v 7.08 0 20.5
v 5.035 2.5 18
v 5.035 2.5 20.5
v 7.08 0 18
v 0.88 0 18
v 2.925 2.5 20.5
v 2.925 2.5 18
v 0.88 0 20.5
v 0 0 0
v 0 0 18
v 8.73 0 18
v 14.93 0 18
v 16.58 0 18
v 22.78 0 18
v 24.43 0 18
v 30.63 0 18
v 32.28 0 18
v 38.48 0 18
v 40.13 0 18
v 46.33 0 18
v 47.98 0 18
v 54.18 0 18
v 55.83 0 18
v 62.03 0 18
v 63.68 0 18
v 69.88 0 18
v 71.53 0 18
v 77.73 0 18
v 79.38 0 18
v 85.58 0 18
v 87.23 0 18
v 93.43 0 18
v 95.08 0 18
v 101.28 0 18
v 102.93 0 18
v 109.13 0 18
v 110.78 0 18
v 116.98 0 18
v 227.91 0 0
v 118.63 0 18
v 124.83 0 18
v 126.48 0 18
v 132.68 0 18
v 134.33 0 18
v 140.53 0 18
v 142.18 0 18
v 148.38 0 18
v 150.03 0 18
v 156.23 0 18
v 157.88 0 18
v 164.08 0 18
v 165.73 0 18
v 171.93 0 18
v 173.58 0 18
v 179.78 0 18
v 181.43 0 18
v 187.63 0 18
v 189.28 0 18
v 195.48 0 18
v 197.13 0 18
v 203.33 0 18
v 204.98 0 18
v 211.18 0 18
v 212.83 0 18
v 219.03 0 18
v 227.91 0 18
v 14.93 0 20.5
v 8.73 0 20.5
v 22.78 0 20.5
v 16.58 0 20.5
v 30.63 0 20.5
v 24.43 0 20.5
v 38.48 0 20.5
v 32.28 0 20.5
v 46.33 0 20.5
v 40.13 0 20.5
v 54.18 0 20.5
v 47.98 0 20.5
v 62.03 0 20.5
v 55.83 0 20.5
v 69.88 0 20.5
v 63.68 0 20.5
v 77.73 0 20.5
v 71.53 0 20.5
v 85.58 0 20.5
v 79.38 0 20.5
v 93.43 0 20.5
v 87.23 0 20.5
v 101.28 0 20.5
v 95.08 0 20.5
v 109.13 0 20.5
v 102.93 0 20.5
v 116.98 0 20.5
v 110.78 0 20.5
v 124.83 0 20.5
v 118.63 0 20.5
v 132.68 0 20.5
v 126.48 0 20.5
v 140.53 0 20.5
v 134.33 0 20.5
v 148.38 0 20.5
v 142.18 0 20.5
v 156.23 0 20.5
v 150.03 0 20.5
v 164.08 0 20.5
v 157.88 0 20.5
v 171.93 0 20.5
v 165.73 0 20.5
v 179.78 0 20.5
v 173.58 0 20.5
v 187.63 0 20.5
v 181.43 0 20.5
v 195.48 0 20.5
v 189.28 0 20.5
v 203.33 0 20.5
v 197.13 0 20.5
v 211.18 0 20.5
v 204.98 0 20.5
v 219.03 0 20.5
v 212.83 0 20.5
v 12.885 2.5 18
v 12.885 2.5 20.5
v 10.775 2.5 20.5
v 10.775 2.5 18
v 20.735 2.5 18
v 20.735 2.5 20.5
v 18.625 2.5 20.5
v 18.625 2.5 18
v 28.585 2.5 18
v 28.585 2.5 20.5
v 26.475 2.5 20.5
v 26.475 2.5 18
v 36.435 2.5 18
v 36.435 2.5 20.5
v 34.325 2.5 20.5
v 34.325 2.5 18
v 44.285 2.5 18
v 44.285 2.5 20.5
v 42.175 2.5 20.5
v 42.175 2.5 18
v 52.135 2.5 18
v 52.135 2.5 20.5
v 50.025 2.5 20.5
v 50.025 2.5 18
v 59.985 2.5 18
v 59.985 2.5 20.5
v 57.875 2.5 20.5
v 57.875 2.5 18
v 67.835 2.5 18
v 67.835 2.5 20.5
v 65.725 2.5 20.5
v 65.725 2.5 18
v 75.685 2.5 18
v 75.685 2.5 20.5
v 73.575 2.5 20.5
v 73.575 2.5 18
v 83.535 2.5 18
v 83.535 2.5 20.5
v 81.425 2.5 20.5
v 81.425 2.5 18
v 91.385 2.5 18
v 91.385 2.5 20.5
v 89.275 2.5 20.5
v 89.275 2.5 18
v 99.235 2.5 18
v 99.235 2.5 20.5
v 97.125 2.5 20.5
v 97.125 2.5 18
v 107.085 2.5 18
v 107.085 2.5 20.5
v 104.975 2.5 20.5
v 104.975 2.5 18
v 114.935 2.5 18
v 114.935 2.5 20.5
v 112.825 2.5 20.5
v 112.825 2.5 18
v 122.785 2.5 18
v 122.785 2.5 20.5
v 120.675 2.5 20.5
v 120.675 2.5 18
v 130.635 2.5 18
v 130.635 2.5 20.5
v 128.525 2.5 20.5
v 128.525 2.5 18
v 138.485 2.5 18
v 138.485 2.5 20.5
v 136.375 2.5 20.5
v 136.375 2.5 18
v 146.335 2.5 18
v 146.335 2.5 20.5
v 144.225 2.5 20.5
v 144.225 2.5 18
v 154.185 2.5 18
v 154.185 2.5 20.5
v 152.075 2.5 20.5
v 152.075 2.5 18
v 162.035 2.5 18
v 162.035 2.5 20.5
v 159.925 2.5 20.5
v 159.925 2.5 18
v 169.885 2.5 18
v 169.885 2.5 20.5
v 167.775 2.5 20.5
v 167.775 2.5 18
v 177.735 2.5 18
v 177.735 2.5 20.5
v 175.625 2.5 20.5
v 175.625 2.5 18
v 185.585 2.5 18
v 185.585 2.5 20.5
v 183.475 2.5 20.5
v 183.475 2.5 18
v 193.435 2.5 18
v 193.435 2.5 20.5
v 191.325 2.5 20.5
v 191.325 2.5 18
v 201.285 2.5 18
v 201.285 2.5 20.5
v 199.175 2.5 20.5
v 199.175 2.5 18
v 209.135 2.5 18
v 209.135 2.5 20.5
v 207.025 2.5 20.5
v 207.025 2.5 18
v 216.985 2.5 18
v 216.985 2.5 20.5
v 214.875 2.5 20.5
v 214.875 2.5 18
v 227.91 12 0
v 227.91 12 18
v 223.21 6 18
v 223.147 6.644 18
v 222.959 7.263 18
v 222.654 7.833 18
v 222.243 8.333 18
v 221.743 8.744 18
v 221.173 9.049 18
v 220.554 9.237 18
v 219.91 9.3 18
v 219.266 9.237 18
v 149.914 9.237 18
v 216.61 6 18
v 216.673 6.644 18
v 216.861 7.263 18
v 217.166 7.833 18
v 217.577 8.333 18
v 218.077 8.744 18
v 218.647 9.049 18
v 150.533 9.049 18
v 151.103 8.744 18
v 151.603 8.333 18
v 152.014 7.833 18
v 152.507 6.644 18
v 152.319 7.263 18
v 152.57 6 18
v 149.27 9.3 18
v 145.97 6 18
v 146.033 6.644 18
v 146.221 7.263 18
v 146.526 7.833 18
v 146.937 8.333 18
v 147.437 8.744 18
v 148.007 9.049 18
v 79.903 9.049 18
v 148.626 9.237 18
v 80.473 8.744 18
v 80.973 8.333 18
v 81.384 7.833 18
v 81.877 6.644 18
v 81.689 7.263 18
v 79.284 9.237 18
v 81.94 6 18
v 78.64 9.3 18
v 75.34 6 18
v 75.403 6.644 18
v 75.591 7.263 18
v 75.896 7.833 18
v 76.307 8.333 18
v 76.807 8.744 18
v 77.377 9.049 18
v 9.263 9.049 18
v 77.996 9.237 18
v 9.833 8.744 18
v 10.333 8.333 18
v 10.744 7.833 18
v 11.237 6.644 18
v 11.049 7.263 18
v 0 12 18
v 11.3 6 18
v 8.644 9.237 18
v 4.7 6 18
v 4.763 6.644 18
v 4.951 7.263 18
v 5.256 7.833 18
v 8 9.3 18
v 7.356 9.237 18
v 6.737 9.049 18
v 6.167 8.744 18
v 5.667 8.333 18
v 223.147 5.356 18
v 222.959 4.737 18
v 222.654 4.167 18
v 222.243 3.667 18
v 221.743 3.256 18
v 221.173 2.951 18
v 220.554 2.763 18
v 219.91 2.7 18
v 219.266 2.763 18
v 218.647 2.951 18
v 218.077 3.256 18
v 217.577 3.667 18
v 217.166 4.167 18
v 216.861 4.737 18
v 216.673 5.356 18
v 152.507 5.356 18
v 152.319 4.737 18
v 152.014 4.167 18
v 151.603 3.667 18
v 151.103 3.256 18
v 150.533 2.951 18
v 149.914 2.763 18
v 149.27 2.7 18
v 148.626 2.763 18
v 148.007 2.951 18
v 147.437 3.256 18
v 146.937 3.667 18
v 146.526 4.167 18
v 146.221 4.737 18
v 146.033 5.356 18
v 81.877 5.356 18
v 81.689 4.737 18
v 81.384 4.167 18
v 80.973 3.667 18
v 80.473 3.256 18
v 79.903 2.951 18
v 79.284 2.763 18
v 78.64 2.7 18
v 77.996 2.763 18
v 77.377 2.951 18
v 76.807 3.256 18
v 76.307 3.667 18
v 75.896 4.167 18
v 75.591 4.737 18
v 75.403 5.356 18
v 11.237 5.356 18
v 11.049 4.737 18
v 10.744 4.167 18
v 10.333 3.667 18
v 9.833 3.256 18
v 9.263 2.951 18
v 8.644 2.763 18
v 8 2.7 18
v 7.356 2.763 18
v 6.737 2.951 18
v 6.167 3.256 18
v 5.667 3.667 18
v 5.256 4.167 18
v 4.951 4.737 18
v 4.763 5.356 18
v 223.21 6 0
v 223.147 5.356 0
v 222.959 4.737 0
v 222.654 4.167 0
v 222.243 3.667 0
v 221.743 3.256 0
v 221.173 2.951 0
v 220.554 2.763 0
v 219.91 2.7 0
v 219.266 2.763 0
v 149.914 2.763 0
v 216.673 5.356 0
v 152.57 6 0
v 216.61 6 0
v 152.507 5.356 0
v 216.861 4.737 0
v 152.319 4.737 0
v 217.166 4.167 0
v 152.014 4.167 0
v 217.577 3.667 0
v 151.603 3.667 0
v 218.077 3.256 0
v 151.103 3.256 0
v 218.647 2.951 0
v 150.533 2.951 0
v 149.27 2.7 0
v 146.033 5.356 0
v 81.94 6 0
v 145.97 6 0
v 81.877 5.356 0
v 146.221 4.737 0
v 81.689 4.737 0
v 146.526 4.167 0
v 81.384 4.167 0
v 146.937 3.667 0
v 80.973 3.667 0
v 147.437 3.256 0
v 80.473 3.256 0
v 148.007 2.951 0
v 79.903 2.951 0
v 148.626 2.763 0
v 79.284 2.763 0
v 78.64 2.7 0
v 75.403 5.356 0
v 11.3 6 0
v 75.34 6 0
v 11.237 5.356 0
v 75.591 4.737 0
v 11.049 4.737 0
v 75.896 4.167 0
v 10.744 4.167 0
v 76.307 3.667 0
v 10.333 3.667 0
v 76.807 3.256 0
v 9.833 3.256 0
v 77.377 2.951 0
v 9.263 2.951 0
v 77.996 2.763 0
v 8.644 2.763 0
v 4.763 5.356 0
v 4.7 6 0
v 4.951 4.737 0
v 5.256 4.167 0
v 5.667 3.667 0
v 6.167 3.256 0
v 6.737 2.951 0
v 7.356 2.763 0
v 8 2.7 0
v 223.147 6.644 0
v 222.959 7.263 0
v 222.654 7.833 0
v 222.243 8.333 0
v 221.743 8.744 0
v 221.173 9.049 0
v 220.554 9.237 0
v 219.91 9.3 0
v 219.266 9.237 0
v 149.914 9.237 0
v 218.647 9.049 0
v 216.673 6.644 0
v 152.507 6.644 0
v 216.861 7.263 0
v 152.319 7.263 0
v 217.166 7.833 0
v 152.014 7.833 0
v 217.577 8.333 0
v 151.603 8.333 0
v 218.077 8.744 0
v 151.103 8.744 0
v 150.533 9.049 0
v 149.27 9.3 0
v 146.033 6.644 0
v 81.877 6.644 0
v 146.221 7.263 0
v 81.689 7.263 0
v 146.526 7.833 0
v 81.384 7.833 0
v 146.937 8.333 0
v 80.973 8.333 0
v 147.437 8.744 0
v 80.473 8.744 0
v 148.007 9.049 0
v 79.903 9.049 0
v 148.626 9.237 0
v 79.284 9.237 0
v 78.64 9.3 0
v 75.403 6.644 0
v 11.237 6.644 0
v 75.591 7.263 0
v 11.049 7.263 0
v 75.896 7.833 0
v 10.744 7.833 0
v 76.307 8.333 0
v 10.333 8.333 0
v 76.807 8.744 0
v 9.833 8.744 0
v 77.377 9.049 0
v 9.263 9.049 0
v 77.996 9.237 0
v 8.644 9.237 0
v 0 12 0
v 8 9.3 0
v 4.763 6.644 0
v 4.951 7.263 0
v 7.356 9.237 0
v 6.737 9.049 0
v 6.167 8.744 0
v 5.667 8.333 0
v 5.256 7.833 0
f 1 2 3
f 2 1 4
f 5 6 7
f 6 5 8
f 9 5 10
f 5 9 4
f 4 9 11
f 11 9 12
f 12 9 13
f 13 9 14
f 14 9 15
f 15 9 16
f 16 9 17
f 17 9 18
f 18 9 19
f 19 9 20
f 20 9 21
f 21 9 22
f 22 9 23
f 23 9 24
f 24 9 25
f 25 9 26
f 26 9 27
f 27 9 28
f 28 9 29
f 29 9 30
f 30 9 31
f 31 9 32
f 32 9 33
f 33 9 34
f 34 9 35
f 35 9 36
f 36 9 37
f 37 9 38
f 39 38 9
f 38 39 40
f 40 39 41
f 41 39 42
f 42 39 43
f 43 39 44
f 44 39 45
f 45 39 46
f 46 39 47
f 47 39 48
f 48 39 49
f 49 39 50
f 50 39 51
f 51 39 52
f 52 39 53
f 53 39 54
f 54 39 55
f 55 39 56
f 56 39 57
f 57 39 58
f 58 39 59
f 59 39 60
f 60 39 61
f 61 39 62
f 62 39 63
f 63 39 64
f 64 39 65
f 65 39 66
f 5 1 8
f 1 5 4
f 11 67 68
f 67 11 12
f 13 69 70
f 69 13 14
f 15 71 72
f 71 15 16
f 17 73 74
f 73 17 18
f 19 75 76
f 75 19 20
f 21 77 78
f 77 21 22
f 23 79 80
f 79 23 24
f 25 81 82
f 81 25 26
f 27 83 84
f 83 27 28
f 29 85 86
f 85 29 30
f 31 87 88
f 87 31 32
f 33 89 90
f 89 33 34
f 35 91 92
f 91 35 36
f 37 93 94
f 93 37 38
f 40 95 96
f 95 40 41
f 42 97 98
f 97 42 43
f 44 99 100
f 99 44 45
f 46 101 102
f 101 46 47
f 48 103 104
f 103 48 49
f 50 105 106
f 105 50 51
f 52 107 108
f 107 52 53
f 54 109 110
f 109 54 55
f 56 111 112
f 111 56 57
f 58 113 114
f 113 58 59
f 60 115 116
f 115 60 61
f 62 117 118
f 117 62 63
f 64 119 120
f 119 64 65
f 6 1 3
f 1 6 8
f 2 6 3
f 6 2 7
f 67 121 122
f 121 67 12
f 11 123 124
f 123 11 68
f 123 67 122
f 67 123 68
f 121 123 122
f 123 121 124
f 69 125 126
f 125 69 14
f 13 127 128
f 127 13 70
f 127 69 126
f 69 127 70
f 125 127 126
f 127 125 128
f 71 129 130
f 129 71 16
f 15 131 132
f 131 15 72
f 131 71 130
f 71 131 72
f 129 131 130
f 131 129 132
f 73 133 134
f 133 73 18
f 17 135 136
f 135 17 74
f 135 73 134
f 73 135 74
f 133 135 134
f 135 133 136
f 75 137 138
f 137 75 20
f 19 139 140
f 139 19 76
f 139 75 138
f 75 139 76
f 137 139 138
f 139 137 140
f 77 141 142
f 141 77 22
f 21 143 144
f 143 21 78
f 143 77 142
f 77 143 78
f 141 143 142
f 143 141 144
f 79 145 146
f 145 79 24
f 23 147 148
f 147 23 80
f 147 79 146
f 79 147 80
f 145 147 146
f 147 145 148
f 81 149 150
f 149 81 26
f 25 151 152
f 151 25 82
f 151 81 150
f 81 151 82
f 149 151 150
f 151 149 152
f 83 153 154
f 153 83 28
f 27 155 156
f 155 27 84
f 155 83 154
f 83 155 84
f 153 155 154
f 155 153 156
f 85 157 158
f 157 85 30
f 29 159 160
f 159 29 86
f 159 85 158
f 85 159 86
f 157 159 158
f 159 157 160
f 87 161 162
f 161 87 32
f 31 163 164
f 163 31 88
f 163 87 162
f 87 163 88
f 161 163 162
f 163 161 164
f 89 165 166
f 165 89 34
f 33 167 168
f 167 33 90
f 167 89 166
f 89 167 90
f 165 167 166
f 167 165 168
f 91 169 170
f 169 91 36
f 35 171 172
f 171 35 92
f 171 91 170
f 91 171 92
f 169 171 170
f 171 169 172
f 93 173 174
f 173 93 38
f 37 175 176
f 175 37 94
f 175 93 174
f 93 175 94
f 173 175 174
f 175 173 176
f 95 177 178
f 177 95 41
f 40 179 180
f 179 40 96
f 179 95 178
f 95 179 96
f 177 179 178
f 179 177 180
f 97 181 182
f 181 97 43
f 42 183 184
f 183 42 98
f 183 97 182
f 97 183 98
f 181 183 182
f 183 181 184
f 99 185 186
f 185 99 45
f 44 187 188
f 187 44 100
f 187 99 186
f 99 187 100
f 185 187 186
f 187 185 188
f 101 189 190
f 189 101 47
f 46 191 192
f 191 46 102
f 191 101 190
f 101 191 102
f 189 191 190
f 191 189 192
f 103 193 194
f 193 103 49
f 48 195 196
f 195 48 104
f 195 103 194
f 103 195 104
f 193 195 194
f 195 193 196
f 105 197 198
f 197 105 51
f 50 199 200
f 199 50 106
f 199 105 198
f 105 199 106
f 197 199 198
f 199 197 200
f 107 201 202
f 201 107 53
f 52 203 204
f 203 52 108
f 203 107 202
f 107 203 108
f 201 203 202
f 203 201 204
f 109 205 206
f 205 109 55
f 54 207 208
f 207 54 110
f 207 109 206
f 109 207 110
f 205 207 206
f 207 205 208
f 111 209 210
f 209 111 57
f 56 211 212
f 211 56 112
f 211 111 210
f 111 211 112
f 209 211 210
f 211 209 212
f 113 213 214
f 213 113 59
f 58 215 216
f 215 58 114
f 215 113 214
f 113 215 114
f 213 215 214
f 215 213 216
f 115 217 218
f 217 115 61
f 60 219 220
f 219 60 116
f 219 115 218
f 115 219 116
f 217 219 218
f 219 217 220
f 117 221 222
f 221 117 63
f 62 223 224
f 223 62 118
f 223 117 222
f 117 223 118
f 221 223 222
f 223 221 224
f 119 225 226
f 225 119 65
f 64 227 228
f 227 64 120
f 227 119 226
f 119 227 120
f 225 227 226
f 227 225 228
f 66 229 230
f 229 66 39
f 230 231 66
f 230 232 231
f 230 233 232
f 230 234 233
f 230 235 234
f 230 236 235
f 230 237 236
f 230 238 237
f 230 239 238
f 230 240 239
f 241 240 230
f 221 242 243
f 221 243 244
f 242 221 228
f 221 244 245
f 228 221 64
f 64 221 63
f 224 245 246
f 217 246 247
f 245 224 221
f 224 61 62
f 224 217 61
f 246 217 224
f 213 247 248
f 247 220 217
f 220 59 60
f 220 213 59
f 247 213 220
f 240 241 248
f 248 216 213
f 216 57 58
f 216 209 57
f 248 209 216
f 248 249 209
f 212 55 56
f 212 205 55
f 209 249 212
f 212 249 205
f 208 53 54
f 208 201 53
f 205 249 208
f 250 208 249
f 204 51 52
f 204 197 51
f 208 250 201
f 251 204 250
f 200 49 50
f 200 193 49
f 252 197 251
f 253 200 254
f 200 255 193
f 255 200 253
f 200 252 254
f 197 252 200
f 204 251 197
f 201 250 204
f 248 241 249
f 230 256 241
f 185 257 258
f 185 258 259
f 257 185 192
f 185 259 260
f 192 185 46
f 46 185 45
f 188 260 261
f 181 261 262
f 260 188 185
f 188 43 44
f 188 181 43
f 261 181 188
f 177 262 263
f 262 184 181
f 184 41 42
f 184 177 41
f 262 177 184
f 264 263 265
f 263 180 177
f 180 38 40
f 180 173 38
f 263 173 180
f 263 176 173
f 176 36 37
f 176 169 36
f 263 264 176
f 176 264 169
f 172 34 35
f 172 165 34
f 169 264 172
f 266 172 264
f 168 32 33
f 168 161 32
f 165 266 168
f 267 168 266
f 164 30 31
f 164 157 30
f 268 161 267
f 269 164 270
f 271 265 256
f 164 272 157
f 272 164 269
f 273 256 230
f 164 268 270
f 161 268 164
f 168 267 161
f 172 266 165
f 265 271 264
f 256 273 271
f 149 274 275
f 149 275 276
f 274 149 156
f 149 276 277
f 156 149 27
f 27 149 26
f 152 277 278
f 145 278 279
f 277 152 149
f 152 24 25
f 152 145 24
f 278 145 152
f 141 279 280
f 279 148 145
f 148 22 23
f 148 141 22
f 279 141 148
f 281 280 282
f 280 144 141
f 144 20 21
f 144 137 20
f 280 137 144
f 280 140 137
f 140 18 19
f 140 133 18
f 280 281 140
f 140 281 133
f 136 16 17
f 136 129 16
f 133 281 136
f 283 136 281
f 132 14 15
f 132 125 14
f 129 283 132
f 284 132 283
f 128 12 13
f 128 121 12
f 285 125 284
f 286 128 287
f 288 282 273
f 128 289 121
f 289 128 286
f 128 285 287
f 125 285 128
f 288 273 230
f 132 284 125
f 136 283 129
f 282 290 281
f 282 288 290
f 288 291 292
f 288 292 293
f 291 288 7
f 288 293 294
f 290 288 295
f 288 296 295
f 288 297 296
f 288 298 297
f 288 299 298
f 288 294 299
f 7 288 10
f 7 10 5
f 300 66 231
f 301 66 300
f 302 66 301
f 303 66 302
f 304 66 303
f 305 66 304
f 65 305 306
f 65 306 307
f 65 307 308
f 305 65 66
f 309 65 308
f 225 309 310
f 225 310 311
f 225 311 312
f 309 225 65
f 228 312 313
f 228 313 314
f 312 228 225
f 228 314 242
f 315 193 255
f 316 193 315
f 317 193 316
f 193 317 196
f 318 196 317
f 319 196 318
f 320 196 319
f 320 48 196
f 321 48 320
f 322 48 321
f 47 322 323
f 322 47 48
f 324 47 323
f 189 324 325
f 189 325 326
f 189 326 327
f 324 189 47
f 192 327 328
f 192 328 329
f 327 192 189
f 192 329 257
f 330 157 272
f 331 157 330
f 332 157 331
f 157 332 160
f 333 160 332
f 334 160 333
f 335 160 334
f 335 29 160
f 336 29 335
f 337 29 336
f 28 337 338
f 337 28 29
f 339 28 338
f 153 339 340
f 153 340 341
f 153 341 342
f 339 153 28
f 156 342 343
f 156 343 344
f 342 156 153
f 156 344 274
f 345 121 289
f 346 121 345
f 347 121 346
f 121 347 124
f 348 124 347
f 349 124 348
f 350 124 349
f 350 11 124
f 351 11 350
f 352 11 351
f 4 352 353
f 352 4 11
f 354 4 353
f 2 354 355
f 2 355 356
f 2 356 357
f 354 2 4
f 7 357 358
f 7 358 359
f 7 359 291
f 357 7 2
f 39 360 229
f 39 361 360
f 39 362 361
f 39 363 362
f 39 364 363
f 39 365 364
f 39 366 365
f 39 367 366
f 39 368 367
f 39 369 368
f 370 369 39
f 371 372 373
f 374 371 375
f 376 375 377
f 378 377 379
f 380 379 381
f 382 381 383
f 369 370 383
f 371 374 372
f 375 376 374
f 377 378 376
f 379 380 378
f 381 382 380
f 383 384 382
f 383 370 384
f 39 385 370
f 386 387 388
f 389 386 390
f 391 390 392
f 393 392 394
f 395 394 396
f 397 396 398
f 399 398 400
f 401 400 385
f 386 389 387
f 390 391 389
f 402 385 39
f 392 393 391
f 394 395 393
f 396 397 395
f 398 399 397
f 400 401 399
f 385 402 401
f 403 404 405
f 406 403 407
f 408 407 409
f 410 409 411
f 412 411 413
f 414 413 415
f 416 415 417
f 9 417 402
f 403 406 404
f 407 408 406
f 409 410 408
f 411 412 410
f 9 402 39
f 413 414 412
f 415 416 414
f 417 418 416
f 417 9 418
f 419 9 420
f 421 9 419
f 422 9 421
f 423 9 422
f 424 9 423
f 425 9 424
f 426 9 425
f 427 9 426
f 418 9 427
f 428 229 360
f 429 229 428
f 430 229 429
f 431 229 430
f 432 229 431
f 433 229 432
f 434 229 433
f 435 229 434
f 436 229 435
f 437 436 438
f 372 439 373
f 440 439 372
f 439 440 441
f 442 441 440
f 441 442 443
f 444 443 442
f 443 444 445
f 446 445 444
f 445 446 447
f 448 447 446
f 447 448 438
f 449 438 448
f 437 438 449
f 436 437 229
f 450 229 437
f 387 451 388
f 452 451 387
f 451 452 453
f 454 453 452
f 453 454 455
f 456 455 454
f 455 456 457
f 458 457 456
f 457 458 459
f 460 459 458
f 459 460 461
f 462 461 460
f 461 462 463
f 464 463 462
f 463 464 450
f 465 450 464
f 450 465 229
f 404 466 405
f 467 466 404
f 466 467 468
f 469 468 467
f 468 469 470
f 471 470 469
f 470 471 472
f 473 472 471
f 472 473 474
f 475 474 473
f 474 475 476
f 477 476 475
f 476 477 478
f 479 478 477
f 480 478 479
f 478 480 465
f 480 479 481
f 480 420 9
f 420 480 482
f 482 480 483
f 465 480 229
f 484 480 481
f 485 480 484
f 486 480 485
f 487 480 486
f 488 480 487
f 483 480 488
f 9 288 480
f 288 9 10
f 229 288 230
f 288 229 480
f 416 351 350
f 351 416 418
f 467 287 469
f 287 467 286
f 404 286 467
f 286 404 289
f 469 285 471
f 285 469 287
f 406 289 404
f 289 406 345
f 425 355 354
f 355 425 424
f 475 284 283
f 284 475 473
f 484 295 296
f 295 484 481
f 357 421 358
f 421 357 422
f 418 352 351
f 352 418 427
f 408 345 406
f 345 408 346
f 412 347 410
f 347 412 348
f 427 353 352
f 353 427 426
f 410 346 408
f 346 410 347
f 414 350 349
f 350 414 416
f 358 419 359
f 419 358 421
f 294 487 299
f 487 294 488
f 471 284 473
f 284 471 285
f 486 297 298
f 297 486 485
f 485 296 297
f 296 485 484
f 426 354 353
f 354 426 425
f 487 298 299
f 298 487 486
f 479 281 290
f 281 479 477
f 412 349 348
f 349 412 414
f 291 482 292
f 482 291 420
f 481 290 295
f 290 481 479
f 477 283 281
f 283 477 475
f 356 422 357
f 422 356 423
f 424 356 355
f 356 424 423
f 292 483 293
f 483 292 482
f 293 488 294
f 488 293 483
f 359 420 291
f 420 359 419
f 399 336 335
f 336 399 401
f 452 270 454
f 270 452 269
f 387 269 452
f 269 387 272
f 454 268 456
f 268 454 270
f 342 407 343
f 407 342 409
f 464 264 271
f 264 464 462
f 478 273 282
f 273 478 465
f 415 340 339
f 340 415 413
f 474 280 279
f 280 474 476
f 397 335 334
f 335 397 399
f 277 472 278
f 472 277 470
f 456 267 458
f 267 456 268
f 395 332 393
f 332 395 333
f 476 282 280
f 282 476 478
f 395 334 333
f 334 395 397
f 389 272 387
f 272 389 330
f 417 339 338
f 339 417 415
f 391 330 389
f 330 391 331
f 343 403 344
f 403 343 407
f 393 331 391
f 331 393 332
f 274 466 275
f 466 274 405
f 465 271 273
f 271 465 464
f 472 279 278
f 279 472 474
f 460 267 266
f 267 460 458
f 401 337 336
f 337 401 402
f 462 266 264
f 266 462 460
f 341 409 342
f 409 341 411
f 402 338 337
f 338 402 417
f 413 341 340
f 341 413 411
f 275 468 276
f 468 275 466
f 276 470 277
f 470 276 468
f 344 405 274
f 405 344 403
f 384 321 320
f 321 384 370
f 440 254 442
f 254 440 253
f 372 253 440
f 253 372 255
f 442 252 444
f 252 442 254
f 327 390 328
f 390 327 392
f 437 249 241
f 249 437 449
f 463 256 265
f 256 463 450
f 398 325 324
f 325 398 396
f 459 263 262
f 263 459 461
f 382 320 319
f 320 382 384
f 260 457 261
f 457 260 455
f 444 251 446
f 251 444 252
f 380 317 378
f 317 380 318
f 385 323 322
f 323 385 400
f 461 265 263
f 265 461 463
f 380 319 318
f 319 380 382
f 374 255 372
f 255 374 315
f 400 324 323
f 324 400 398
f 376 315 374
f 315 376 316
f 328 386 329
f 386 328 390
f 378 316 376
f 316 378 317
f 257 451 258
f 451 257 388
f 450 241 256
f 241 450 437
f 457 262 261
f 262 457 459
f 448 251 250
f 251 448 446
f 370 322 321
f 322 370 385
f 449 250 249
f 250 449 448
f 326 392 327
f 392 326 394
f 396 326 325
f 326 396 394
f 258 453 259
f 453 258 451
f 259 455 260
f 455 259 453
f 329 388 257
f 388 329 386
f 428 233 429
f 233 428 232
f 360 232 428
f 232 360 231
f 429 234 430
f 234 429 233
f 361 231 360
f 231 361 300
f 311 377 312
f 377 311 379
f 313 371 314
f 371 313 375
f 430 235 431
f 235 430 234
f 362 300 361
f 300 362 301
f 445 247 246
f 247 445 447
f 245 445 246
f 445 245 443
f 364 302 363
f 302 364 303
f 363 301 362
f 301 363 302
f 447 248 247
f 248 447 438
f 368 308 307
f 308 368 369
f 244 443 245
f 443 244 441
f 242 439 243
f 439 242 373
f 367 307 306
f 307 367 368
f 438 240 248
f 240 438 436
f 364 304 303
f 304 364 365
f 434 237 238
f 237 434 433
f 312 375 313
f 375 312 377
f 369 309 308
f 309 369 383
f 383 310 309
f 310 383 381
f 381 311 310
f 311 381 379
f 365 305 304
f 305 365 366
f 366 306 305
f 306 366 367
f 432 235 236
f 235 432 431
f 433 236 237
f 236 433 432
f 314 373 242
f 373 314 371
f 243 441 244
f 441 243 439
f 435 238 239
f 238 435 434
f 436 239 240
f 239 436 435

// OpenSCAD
$fn = 32;

// ----------------------------------------------------------------------
// Gear rack: m=2.5 z=28, 227.91 x 12 x 20.5 mm
// ----------------------------------------------------------------------

// --- parameters (mm) ---
length = 227.91;          // rack length, X
width = 12;               // rack width, Y
height = 20.5;            // overall height, Z
module_m = 2.5;           // module
back_t = 18;              // tooth root line height
pitch = 7.85;             // circular pitch
tip_w = 2.11;             // tooth thickness at the tip
root_w = 6.2;             // tooth thickness at the root line
hole_d = 6.6;             // mounting hole
sink = 0.6;               // tooth root overlap into the body

tooth_span = 219.91;

module tooth(x0) {
  /* 20 deg flank profile, sunk into the body for a positive overlap */
  translate([x0, 0, back_t - sink])
    linear_extrude(height = height - back_t + sink)
      polygon(points = [[-root_w / 2, 0], [root_w / 2, 0],
                        [tip_w / 2, height - back_t],
                        [-tip_w / 2, height - back_t]]);
}

difference() {
  union() {
    cube([length, width, back_t]);
    for (i = [0 : 28 - 1])
      tooth((i + 0.5) * pitch + (tooth_span - 28 * pitch) / 2);
  }
  translate([8, 6, -1]) cylinder(h = back_t + 2, d = hole_d);
  translate([78.64, 6, -1]) cylinder(h = back_t + 2, d = hole_d);
  translate([149.27, 6, -1]) cylinder(h = back_t + 2, d = hole_d);
  translate([219.91, 6, -1]) cylinder(h = back_t + 2, d = hole_d);
}
